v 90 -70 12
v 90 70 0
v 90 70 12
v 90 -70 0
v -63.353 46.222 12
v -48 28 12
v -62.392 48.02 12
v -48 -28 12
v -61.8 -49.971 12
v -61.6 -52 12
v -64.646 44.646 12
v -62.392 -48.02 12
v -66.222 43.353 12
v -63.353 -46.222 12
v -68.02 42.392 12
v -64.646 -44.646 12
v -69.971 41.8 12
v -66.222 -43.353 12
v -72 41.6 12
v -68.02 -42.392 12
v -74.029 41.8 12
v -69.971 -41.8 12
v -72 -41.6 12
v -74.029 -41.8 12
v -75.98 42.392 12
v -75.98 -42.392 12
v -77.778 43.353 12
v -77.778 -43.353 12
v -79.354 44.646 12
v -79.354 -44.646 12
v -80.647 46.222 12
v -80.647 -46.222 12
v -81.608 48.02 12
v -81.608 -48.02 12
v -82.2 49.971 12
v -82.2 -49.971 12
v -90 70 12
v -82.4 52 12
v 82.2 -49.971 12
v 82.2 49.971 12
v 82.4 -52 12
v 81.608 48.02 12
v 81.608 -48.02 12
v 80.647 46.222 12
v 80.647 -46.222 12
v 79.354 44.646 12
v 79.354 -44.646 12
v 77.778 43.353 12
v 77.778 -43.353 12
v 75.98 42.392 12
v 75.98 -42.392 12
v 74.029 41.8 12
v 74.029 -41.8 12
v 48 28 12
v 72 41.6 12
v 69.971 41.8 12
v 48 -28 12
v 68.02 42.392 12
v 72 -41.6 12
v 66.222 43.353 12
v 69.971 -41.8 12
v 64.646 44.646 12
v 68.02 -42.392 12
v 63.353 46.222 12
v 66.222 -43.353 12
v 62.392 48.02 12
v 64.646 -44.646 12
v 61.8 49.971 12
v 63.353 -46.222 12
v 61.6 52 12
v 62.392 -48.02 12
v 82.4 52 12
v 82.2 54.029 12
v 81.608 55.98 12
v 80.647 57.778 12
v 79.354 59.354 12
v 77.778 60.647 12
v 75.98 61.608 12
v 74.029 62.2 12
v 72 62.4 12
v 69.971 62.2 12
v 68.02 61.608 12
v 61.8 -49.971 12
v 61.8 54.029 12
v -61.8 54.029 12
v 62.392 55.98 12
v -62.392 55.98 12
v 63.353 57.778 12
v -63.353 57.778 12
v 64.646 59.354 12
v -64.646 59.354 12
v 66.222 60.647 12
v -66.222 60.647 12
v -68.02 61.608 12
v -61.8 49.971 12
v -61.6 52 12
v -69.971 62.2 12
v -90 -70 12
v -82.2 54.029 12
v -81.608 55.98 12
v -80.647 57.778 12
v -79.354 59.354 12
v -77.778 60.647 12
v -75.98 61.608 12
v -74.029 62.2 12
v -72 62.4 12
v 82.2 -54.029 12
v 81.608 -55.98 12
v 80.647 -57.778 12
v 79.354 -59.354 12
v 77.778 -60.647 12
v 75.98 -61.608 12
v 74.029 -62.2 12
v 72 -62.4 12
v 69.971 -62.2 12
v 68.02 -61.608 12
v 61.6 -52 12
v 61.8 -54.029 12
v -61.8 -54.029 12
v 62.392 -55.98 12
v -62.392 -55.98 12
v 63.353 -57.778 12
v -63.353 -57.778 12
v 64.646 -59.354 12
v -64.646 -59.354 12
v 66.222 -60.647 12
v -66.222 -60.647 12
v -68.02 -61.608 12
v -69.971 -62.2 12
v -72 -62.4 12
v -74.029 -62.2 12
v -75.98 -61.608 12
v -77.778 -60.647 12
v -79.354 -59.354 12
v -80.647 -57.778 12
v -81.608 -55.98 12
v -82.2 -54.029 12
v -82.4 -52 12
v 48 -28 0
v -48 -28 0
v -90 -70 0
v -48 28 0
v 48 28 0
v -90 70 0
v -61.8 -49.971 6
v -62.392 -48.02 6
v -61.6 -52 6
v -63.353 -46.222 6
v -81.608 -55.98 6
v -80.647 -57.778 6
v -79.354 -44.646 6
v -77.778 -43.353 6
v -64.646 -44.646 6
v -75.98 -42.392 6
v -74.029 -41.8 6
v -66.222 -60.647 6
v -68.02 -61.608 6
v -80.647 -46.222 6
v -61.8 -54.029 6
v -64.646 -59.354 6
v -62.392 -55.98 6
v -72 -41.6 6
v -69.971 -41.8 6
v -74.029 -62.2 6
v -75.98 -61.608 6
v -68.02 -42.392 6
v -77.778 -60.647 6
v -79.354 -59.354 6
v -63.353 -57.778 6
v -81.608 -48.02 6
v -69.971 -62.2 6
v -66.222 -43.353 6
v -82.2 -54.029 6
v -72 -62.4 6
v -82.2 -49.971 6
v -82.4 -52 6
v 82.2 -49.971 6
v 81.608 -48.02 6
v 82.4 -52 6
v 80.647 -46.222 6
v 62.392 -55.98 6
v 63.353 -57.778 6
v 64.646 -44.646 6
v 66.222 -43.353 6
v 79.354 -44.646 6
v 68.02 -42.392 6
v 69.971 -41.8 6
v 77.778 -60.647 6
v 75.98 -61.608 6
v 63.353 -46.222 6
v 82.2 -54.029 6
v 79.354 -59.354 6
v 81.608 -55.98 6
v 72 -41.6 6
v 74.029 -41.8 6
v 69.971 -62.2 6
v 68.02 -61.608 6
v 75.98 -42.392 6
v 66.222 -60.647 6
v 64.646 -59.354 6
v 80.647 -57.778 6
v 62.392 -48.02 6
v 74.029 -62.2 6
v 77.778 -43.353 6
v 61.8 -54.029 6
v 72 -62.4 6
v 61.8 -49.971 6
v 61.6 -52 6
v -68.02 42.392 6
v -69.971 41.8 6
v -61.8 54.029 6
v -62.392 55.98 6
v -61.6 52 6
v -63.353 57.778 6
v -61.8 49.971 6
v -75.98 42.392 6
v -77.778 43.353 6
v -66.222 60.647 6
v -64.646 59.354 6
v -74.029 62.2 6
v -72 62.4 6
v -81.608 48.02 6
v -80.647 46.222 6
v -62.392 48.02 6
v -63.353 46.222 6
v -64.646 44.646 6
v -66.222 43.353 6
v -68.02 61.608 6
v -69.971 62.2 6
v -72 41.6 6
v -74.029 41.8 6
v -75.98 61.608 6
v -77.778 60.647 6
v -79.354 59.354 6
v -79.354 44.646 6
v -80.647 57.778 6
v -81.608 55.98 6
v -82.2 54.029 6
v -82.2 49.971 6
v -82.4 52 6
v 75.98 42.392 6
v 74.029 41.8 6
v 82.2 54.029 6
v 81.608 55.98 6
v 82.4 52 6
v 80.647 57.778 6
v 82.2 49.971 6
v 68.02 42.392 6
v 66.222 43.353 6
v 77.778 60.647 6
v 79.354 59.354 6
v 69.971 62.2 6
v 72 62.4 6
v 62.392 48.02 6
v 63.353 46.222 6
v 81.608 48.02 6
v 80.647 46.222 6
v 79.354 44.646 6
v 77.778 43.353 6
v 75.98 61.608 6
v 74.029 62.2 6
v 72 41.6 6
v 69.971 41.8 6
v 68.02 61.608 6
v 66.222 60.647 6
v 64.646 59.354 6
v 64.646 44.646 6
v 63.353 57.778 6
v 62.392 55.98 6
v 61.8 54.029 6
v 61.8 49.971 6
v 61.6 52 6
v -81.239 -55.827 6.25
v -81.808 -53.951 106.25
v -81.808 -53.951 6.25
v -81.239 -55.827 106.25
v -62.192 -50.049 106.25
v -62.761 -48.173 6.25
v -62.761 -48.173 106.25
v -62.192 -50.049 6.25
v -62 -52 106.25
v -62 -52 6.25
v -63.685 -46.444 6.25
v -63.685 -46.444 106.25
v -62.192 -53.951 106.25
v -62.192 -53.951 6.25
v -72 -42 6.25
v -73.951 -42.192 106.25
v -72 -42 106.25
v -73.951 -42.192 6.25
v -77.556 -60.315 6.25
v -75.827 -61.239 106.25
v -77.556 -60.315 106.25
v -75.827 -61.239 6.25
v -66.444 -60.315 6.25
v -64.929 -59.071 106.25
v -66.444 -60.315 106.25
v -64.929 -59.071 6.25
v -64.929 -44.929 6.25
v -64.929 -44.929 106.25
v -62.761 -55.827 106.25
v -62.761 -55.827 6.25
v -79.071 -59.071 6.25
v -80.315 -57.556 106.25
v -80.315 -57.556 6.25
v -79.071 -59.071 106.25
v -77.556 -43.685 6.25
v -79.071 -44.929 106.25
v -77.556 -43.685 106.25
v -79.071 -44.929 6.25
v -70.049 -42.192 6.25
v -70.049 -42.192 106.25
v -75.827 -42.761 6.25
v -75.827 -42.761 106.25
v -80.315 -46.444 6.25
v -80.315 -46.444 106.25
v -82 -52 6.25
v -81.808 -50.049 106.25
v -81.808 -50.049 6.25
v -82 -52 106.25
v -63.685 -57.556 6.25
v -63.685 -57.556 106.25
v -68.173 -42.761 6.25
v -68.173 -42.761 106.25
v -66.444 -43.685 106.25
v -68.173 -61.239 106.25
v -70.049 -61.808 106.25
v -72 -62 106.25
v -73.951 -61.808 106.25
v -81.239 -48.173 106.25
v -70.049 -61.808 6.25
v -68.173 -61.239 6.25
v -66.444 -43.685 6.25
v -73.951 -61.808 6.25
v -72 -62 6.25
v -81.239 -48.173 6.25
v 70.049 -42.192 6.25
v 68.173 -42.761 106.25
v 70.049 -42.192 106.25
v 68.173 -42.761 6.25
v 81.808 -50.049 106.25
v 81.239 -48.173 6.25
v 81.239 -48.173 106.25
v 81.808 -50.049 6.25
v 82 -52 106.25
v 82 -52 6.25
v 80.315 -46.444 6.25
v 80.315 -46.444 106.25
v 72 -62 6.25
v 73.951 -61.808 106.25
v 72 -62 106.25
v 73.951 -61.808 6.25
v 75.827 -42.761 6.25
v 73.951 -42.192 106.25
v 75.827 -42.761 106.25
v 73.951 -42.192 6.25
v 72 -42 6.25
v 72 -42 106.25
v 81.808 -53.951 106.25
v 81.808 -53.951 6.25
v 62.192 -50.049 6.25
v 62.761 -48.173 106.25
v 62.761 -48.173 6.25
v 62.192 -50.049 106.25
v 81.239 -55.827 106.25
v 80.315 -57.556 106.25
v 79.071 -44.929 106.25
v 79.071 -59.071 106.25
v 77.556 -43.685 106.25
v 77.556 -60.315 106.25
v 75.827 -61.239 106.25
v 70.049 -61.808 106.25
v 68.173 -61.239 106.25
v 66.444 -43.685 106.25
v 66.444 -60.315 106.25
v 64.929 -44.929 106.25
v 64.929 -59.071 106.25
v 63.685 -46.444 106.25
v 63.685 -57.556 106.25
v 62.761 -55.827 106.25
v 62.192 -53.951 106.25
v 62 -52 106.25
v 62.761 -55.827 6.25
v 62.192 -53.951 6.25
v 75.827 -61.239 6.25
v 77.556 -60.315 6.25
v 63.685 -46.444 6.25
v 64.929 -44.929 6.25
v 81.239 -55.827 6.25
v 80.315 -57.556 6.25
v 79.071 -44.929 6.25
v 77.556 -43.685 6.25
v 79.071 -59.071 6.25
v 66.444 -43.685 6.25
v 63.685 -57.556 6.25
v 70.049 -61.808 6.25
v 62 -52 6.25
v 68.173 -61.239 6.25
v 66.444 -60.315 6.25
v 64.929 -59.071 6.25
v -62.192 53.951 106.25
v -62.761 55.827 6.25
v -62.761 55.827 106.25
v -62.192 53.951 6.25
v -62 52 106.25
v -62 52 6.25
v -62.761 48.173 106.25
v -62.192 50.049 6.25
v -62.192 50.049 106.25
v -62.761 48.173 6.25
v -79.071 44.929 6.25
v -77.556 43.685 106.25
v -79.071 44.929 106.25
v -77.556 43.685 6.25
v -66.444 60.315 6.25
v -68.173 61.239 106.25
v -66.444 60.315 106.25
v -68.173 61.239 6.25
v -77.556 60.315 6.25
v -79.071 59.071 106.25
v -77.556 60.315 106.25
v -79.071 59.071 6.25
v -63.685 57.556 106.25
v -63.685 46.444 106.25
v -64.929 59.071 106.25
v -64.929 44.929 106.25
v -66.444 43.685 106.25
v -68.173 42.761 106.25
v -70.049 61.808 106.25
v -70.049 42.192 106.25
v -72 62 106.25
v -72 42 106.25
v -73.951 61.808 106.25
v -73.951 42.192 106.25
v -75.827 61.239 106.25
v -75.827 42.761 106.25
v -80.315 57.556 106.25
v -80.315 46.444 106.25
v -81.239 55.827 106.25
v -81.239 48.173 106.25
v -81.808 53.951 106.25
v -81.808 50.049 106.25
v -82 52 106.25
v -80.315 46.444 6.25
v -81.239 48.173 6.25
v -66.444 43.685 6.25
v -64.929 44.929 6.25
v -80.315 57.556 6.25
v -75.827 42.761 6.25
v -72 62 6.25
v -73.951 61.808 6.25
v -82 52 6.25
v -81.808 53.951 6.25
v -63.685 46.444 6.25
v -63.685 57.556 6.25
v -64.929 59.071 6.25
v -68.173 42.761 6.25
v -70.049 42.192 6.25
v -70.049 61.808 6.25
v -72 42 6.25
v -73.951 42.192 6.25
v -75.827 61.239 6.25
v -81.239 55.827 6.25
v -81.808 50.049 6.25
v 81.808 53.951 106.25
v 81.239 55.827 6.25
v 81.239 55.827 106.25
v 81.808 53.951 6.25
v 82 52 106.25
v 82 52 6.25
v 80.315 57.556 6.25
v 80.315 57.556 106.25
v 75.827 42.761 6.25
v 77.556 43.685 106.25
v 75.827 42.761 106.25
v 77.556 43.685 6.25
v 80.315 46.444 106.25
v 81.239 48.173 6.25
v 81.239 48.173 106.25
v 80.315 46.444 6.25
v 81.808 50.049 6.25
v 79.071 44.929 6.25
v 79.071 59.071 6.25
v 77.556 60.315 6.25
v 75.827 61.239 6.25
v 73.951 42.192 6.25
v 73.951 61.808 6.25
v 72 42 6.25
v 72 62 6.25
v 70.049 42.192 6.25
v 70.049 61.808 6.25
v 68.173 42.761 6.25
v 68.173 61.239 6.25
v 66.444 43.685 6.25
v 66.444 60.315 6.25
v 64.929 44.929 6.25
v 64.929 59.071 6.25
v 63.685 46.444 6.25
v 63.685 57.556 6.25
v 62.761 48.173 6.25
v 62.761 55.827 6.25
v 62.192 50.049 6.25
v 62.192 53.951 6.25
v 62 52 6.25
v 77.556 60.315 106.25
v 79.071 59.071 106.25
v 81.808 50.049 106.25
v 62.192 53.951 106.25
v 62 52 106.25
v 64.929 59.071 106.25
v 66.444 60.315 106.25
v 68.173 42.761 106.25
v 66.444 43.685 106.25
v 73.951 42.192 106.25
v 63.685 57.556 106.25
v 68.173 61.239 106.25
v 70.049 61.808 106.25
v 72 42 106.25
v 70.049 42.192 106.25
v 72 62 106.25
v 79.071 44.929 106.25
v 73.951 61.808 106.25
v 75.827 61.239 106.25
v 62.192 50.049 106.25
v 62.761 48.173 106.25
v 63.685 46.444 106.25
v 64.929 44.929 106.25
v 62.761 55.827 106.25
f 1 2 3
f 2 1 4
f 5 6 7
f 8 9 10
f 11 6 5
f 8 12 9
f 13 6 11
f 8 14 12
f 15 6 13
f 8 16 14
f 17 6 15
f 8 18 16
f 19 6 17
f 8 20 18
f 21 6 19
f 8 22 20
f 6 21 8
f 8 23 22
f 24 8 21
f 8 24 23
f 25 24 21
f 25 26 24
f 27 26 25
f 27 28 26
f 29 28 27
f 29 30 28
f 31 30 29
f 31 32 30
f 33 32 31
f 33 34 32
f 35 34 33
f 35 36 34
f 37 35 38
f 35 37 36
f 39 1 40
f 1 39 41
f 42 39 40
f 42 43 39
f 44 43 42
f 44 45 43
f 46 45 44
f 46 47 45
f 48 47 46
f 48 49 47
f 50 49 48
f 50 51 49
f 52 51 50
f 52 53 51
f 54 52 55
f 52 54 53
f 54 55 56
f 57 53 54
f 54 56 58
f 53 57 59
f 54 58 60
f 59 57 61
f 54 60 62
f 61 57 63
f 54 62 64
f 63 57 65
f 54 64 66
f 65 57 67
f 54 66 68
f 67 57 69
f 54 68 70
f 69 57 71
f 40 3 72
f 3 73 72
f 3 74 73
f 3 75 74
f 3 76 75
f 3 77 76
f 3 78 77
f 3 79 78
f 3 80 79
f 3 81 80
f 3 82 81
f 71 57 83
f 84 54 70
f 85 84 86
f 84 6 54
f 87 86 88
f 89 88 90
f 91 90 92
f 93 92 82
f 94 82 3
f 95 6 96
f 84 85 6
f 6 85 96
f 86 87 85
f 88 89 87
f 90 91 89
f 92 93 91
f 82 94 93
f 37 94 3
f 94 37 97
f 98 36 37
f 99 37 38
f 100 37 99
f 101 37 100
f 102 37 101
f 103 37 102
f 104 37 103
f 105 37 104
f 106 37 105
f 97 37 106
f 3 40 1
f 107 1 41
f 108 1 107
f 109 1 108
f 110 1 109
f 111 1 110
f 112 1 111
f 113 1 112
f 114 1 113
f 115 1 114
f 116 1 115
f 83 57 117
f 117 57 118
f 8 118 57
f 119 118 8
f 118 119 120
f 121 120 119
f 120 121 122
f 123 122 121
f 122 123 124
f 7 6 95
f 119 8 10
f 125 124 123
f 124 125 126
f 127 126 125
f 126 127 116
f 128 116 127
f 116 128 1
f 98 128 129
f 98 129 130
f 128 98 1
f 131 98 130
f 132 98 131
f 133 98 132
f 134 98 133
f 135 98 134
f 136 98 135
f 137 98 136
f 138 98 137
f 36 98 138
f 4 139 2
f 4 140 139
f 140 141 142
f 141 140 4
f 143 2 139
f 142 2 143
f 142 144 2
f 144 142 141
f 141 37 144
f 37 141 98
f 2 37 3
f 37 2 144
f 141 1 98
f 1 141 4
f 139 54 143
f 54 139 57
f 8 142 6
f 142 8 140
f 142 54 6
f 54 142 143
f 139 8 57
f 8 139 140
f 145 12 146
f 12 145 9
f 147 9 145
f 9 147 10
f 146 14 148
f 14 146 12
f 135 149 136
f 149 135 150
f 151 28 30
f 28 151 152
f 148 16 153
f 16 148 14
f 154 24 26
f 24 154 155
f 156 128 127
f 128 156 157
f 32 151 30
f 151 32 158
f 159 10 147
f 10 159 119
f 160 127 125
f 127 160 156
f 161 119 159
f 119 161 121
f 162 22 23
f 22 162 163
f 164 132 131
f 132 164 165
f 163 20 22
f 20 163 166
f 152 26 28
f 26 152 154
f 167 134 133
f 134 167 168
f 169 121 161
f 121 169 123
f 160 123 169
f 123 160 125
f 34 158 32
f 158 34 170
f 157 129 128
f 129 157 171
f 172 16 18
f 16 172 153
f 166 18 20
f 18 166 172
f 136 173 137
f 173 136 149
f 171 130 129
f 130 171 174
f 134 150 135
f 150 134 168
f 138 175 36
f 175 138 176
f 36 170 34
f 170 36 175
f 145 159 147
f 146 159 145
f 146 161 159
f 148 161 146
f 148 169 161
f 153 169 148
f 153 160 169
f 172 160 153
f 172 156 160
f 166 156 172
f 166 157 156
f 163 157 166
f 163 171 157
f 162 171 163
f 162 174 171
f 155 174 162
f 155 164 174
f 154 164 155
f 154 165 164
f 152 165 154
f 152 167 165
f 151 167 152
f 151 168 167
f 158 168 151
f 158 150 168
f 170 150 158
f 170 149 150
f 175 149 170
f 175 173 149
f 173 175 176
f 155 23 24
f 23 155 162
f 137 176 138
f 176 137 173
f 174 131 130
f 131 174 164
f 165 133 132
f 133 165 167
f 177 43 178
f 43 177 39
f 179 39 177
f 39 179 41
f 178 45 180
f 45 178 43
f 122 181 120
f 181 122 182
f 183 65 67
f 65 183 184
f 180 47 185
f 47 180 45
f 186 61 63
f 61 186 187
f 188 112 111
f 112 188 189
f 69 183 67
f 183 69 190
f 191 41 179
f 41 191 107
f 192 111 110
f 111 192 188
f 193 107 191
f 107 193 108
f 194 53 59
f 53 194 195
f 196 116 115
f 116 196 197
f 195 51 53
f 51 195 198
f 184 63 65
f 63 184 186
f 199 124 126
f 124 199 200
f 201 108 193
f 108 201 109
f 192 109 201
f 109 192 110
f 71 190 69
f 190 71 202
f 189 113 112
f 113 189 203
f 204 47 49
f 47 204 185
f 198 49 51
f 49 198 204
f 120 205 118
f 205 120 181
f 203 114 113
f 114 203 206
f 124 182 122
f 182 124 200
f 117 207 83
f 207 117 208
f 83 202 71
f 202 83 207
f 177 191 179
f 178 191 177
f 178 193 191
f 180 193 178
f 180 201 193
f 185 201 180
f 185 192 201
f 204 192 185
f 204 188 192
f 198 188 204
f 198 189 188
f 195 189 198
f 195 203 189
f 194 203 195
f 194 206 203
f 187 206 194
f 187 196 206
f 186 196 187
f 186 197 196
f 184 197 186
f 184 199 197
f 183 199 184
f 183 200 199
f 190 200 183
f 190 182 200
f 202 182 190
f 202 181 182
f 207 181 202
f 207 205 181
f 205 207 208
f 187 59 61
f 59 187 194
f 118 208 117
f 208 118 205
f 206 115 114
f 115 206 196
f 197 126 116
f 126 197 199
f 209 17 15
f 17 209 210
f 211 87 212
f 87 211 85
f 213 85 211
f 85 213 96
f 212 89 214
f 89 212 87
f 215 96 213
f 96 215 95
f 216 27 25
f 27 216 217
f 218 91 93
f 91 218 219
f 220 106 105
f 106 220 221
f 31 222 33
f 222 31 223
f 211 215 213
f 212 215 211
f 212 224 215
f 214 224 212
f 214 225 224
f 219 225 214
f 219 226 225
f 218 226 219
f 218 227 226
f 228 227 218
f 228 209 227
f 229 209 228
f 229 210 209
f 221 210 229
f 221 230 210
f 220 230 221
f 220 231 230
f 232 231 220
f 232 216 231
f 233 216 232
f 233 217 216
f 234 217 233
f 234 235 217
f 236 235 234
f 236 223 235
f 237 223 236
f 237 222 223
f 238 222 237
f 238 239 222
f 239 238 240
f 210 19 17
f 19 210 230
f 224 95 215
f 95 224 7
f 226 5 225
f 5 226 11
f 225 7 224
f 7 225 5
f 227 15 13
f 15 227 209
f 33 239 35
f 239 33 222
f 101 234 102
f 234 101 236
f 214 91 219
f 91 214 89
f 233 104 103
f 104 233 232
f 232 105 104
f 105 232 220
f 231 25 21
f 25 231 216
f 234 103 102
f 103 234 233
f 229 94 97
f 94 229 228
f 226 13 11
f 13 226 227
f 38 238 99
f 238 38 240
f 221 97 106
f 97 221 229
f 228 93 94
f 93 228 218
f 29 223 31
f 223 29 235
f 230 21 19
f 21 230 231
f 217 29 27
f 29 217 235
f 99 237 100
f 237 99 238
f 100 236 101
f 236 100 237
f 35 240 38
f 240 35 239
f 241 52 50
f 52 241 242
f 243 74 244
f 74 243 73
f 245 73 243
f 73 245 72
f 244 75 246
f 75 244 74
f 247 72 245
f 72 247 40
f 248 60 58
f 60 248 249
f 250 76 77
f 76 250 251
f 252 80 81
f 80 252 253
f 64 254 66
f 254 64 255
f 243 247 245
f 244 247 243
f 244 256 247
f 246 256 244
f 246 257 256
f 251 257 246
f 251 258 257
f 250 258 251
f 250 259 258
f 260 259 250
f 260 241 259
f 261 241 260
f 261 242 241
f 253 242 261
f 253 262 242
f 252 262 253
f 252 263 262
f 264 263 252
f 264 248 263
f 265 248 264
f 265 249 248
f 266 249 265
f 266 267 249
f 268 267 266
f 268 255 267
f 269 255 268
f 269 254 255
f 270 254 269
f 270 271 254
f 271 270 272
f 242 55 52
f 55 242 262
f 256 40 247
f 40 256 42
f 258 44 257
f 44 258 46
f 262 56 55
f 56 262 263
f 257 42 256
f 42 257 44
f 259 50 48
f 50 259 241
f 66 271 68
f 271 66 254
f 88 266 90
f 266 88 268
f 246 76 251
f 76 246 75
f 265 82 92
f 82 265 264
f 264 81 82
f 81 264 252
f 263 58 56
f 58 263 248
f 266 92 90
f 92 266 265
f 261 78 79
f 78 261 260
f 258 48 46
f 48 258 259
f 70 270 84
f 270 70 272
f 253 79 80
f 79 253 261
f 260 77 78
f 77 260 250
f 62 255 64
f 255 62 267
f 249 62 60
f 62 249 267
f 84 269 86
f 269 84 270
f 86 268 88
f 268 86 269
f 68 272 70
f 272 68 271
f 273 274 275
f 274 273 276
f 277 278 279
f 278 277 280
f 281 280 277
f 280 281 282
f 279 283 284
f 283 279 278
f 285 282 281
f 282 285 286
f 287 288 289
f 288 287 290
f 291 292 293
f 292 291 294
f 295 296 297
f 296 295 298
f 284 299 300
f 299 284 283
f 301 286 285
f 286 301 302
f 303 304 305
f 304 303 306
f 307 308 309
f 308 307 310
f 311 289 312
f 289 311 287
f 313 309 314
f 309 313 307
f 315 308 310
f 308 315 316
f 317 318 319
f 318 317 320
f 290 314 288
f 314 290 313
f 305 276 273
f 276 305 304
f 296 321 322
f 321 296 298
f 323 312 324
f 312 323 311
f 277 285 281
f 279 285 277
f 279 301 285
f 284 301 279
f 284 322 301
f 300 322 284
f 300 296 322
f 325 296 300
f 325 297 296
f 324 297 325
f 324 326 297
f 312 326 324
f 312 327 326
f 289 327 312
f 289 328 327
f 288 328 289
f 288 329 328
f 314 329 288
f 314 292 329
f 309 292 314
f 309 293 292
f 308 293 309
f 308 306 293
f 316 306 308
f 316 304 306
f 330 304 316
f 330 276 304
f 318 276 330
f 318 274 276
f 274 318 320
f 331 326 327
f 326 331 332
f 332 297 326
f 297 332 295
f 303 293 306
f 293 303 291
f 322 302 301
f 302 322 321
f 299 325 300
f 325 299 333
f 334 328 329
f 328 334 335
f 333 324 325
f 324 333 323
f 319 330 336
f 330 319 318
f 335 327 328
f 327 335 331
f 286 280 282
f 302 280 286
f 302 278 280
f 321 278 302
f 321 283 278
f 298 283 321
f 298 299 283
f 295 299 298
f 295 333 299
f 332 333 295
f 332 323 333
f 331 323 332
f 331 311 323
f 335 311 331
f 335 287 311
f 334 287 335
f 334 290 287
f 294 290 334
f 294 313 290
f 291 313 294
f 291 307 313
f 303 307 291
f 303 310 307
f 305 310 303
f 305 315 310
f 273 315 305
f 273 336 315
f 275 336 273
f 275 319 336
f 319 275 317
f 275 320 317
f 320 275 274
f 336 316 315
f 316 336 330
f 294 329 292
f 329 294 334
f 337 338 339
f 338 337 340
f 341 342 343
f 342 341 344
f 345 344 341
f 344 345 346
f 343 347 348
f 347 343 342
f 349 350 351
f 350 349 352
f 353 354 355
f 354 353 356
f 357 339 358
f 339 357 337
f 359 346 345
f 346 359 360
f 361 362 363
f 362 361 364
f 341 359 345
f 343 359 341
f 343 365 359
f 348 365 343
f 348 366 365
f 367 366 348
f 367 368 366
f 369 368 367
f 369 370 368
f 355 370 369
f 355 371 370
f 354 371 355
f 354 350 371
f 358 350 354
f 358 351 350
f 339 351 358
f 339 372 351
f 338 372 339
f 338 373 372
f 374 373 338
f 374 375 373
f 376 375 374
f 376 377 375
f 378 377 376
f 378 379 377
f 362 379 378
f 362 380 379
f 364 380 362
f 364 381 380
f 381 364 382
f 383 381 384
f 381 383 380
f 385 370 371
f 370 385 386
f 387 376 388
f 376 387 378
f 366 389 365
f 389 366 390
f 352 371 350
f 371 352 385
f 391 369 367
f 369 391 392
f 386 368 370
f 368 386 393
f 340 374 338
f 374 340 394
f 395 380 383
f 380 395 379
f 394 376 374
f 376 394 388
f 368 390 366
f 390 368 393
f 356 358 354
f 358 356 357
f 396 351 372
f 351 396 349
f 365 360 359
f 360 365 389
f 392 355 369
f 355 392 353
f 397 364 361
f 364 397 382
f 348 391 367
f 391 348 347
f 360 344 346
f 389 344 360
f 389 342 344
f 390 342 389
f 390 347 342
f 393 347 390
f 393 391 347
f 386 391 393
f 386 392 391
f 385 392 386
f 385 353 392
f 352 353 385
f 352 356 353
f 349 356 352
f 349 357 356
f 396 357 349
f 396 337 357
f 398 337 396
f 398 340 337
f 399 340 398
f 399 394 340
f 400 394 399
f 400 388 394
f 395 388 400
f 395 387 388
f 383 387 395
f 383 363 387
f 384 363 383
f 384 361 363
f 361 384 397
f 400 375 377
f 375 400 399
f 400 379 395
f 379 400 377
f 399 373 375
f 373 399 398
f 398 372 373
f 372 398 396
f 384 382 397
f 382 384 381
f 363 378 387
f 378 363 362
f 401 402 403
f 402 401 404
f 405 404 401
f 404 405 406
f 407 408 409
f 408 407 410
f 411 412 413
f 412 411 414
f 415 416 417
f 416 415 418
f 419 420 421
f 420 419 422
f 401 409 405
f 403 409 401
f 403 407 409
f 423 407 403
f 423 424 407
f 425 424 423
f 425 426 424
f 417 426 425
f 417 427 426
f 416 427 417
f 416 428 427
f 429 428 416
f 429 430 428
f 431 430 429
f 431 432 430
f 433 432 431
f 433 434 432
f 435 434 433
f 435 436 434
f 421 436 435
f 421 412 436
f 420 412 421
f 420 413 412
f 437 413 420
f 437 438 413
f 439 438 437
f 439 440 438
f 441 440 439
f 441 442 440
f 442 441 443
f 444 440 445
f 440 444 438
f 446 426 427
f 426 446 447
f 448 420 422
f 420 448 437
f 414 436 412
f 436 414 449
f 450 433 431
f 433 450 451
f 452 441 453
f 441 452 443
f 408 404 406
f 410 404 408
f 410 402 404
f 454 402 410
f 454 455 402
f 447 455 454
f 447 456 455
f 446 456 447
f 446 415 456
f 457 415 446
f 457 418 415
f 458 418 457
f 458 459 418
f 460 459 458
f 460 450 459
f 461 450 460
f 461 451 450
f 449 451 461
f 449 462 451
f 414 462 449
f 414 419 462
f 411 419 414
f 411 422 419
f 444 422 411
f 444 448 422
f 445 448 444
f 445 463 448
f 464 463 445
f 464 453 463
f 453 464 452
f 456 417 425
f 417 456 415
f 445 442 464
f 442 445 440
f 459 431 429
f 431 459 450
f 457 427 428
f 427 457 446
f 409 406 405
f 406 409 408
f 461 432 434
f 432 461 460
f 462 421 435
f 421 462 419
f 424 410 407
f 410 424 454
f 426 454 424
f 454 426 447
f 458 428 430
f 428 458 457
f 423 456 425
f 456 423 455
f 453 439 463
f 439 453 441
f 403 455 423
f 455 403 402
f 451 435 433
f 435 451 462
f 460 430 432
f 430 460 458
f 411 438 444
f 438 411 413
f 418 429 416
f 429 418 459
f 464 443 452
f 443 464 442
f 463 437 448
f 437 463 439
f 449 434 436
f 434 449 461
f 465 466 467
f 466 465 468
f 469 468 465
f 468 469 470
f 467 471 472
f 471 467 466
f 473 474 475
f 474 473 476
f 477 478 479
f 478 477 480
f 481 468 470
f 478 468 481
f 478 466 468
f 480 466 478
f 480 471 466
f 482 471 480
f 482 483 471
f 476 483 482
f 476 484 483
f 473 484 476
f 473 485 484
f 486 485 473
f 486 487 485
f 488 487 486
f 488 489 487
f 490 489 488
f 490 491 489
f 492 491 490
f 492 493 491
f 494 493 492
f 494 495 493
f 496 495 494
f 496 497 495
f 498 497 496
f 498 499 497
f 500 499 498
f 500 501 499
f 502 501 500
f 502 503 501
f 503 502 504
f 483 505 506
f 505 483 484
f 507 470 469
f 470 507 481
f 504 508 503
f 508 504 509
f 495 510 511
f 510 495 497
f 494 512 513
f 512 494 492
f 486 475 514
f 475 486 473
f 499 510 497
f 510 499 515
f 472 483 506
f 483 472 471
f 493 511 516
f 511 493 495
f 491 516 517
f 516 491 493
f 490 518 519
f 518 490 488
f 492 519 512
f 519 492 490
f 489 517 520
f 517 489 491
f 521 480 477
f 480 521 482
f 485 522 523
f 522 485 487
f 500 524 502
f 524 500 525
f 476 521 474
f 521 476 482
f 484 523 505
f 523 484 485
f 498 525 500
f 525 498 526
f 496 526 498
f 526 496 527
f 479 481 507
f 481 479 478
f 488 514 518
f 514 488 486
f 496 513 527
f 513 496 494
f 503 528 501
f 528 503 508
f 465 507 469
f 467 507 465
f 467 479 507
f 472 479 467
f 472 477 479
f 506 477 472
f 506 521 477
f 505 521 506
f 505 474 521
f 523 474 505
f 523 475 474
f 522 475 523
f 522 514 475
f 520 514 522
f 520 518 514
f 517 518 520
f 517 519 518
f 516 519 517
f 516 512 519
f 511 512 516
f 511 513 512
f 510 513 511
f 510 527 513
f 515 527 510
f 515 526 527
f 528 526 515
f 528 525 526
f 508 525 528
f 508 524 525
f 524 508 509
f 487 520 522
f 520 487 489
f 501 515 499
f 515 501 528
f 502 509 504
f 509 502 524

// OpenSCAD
$fn = 32;

// ------------------------------------------------------------------------
// Frame with four posts: 180 x 140 mm frame, four d20 posts
// Every part is its own module, assembly() places them once.
// ------------------------------------------------------------------------

// --- part 1 ---
module base_frame() {
  difference() {
    translate([-90, -70, 0]) cube([180, 140, 12]);
    translate([-48, -28, -1]) cube([96, 56, 14]);
    translate([-72, -52, 6]) cylinder(h = 7, d = 20.8);
    translate([72, -52, 6]) cylinder(h = 7, d = 20.8);
    translate([-72, 52, 6]) cylinder(h = 7, d = 20.8);
    translate([72, 52, 6]) cylinder(h = 7, d = 20.8);
  }
}

// --- part 2 ---
module post1() {
  cylinder(h = 100, d = 20);
}

// --- part 3 ---
module post2() {
  cylinder(h = 100, d = 20);
}

// --- part 4 ---
module post3() {
  cylinder(h = 100, d = 20);
}

// --- part 5 ---
module post4() {
  cylinder(h = 100, d = 20);
}

// --- assembly ---
module assembly() {
  translate([0, 0, 0]) rotate([0, 0, 0]) base_frame();
  translate([-72, -52, 6.25]) rotate([0, 0, 0]) post1();
  translate([72, -52, 6.25]) rotate([0, 0, 0]) post2();
  translate([-72, 52, 6.25]) rotate([0, 0, 0]) post3();
  translate([72, 52, 6.25]) rotate([0, 0, 0]) post4();
}

assembly();
